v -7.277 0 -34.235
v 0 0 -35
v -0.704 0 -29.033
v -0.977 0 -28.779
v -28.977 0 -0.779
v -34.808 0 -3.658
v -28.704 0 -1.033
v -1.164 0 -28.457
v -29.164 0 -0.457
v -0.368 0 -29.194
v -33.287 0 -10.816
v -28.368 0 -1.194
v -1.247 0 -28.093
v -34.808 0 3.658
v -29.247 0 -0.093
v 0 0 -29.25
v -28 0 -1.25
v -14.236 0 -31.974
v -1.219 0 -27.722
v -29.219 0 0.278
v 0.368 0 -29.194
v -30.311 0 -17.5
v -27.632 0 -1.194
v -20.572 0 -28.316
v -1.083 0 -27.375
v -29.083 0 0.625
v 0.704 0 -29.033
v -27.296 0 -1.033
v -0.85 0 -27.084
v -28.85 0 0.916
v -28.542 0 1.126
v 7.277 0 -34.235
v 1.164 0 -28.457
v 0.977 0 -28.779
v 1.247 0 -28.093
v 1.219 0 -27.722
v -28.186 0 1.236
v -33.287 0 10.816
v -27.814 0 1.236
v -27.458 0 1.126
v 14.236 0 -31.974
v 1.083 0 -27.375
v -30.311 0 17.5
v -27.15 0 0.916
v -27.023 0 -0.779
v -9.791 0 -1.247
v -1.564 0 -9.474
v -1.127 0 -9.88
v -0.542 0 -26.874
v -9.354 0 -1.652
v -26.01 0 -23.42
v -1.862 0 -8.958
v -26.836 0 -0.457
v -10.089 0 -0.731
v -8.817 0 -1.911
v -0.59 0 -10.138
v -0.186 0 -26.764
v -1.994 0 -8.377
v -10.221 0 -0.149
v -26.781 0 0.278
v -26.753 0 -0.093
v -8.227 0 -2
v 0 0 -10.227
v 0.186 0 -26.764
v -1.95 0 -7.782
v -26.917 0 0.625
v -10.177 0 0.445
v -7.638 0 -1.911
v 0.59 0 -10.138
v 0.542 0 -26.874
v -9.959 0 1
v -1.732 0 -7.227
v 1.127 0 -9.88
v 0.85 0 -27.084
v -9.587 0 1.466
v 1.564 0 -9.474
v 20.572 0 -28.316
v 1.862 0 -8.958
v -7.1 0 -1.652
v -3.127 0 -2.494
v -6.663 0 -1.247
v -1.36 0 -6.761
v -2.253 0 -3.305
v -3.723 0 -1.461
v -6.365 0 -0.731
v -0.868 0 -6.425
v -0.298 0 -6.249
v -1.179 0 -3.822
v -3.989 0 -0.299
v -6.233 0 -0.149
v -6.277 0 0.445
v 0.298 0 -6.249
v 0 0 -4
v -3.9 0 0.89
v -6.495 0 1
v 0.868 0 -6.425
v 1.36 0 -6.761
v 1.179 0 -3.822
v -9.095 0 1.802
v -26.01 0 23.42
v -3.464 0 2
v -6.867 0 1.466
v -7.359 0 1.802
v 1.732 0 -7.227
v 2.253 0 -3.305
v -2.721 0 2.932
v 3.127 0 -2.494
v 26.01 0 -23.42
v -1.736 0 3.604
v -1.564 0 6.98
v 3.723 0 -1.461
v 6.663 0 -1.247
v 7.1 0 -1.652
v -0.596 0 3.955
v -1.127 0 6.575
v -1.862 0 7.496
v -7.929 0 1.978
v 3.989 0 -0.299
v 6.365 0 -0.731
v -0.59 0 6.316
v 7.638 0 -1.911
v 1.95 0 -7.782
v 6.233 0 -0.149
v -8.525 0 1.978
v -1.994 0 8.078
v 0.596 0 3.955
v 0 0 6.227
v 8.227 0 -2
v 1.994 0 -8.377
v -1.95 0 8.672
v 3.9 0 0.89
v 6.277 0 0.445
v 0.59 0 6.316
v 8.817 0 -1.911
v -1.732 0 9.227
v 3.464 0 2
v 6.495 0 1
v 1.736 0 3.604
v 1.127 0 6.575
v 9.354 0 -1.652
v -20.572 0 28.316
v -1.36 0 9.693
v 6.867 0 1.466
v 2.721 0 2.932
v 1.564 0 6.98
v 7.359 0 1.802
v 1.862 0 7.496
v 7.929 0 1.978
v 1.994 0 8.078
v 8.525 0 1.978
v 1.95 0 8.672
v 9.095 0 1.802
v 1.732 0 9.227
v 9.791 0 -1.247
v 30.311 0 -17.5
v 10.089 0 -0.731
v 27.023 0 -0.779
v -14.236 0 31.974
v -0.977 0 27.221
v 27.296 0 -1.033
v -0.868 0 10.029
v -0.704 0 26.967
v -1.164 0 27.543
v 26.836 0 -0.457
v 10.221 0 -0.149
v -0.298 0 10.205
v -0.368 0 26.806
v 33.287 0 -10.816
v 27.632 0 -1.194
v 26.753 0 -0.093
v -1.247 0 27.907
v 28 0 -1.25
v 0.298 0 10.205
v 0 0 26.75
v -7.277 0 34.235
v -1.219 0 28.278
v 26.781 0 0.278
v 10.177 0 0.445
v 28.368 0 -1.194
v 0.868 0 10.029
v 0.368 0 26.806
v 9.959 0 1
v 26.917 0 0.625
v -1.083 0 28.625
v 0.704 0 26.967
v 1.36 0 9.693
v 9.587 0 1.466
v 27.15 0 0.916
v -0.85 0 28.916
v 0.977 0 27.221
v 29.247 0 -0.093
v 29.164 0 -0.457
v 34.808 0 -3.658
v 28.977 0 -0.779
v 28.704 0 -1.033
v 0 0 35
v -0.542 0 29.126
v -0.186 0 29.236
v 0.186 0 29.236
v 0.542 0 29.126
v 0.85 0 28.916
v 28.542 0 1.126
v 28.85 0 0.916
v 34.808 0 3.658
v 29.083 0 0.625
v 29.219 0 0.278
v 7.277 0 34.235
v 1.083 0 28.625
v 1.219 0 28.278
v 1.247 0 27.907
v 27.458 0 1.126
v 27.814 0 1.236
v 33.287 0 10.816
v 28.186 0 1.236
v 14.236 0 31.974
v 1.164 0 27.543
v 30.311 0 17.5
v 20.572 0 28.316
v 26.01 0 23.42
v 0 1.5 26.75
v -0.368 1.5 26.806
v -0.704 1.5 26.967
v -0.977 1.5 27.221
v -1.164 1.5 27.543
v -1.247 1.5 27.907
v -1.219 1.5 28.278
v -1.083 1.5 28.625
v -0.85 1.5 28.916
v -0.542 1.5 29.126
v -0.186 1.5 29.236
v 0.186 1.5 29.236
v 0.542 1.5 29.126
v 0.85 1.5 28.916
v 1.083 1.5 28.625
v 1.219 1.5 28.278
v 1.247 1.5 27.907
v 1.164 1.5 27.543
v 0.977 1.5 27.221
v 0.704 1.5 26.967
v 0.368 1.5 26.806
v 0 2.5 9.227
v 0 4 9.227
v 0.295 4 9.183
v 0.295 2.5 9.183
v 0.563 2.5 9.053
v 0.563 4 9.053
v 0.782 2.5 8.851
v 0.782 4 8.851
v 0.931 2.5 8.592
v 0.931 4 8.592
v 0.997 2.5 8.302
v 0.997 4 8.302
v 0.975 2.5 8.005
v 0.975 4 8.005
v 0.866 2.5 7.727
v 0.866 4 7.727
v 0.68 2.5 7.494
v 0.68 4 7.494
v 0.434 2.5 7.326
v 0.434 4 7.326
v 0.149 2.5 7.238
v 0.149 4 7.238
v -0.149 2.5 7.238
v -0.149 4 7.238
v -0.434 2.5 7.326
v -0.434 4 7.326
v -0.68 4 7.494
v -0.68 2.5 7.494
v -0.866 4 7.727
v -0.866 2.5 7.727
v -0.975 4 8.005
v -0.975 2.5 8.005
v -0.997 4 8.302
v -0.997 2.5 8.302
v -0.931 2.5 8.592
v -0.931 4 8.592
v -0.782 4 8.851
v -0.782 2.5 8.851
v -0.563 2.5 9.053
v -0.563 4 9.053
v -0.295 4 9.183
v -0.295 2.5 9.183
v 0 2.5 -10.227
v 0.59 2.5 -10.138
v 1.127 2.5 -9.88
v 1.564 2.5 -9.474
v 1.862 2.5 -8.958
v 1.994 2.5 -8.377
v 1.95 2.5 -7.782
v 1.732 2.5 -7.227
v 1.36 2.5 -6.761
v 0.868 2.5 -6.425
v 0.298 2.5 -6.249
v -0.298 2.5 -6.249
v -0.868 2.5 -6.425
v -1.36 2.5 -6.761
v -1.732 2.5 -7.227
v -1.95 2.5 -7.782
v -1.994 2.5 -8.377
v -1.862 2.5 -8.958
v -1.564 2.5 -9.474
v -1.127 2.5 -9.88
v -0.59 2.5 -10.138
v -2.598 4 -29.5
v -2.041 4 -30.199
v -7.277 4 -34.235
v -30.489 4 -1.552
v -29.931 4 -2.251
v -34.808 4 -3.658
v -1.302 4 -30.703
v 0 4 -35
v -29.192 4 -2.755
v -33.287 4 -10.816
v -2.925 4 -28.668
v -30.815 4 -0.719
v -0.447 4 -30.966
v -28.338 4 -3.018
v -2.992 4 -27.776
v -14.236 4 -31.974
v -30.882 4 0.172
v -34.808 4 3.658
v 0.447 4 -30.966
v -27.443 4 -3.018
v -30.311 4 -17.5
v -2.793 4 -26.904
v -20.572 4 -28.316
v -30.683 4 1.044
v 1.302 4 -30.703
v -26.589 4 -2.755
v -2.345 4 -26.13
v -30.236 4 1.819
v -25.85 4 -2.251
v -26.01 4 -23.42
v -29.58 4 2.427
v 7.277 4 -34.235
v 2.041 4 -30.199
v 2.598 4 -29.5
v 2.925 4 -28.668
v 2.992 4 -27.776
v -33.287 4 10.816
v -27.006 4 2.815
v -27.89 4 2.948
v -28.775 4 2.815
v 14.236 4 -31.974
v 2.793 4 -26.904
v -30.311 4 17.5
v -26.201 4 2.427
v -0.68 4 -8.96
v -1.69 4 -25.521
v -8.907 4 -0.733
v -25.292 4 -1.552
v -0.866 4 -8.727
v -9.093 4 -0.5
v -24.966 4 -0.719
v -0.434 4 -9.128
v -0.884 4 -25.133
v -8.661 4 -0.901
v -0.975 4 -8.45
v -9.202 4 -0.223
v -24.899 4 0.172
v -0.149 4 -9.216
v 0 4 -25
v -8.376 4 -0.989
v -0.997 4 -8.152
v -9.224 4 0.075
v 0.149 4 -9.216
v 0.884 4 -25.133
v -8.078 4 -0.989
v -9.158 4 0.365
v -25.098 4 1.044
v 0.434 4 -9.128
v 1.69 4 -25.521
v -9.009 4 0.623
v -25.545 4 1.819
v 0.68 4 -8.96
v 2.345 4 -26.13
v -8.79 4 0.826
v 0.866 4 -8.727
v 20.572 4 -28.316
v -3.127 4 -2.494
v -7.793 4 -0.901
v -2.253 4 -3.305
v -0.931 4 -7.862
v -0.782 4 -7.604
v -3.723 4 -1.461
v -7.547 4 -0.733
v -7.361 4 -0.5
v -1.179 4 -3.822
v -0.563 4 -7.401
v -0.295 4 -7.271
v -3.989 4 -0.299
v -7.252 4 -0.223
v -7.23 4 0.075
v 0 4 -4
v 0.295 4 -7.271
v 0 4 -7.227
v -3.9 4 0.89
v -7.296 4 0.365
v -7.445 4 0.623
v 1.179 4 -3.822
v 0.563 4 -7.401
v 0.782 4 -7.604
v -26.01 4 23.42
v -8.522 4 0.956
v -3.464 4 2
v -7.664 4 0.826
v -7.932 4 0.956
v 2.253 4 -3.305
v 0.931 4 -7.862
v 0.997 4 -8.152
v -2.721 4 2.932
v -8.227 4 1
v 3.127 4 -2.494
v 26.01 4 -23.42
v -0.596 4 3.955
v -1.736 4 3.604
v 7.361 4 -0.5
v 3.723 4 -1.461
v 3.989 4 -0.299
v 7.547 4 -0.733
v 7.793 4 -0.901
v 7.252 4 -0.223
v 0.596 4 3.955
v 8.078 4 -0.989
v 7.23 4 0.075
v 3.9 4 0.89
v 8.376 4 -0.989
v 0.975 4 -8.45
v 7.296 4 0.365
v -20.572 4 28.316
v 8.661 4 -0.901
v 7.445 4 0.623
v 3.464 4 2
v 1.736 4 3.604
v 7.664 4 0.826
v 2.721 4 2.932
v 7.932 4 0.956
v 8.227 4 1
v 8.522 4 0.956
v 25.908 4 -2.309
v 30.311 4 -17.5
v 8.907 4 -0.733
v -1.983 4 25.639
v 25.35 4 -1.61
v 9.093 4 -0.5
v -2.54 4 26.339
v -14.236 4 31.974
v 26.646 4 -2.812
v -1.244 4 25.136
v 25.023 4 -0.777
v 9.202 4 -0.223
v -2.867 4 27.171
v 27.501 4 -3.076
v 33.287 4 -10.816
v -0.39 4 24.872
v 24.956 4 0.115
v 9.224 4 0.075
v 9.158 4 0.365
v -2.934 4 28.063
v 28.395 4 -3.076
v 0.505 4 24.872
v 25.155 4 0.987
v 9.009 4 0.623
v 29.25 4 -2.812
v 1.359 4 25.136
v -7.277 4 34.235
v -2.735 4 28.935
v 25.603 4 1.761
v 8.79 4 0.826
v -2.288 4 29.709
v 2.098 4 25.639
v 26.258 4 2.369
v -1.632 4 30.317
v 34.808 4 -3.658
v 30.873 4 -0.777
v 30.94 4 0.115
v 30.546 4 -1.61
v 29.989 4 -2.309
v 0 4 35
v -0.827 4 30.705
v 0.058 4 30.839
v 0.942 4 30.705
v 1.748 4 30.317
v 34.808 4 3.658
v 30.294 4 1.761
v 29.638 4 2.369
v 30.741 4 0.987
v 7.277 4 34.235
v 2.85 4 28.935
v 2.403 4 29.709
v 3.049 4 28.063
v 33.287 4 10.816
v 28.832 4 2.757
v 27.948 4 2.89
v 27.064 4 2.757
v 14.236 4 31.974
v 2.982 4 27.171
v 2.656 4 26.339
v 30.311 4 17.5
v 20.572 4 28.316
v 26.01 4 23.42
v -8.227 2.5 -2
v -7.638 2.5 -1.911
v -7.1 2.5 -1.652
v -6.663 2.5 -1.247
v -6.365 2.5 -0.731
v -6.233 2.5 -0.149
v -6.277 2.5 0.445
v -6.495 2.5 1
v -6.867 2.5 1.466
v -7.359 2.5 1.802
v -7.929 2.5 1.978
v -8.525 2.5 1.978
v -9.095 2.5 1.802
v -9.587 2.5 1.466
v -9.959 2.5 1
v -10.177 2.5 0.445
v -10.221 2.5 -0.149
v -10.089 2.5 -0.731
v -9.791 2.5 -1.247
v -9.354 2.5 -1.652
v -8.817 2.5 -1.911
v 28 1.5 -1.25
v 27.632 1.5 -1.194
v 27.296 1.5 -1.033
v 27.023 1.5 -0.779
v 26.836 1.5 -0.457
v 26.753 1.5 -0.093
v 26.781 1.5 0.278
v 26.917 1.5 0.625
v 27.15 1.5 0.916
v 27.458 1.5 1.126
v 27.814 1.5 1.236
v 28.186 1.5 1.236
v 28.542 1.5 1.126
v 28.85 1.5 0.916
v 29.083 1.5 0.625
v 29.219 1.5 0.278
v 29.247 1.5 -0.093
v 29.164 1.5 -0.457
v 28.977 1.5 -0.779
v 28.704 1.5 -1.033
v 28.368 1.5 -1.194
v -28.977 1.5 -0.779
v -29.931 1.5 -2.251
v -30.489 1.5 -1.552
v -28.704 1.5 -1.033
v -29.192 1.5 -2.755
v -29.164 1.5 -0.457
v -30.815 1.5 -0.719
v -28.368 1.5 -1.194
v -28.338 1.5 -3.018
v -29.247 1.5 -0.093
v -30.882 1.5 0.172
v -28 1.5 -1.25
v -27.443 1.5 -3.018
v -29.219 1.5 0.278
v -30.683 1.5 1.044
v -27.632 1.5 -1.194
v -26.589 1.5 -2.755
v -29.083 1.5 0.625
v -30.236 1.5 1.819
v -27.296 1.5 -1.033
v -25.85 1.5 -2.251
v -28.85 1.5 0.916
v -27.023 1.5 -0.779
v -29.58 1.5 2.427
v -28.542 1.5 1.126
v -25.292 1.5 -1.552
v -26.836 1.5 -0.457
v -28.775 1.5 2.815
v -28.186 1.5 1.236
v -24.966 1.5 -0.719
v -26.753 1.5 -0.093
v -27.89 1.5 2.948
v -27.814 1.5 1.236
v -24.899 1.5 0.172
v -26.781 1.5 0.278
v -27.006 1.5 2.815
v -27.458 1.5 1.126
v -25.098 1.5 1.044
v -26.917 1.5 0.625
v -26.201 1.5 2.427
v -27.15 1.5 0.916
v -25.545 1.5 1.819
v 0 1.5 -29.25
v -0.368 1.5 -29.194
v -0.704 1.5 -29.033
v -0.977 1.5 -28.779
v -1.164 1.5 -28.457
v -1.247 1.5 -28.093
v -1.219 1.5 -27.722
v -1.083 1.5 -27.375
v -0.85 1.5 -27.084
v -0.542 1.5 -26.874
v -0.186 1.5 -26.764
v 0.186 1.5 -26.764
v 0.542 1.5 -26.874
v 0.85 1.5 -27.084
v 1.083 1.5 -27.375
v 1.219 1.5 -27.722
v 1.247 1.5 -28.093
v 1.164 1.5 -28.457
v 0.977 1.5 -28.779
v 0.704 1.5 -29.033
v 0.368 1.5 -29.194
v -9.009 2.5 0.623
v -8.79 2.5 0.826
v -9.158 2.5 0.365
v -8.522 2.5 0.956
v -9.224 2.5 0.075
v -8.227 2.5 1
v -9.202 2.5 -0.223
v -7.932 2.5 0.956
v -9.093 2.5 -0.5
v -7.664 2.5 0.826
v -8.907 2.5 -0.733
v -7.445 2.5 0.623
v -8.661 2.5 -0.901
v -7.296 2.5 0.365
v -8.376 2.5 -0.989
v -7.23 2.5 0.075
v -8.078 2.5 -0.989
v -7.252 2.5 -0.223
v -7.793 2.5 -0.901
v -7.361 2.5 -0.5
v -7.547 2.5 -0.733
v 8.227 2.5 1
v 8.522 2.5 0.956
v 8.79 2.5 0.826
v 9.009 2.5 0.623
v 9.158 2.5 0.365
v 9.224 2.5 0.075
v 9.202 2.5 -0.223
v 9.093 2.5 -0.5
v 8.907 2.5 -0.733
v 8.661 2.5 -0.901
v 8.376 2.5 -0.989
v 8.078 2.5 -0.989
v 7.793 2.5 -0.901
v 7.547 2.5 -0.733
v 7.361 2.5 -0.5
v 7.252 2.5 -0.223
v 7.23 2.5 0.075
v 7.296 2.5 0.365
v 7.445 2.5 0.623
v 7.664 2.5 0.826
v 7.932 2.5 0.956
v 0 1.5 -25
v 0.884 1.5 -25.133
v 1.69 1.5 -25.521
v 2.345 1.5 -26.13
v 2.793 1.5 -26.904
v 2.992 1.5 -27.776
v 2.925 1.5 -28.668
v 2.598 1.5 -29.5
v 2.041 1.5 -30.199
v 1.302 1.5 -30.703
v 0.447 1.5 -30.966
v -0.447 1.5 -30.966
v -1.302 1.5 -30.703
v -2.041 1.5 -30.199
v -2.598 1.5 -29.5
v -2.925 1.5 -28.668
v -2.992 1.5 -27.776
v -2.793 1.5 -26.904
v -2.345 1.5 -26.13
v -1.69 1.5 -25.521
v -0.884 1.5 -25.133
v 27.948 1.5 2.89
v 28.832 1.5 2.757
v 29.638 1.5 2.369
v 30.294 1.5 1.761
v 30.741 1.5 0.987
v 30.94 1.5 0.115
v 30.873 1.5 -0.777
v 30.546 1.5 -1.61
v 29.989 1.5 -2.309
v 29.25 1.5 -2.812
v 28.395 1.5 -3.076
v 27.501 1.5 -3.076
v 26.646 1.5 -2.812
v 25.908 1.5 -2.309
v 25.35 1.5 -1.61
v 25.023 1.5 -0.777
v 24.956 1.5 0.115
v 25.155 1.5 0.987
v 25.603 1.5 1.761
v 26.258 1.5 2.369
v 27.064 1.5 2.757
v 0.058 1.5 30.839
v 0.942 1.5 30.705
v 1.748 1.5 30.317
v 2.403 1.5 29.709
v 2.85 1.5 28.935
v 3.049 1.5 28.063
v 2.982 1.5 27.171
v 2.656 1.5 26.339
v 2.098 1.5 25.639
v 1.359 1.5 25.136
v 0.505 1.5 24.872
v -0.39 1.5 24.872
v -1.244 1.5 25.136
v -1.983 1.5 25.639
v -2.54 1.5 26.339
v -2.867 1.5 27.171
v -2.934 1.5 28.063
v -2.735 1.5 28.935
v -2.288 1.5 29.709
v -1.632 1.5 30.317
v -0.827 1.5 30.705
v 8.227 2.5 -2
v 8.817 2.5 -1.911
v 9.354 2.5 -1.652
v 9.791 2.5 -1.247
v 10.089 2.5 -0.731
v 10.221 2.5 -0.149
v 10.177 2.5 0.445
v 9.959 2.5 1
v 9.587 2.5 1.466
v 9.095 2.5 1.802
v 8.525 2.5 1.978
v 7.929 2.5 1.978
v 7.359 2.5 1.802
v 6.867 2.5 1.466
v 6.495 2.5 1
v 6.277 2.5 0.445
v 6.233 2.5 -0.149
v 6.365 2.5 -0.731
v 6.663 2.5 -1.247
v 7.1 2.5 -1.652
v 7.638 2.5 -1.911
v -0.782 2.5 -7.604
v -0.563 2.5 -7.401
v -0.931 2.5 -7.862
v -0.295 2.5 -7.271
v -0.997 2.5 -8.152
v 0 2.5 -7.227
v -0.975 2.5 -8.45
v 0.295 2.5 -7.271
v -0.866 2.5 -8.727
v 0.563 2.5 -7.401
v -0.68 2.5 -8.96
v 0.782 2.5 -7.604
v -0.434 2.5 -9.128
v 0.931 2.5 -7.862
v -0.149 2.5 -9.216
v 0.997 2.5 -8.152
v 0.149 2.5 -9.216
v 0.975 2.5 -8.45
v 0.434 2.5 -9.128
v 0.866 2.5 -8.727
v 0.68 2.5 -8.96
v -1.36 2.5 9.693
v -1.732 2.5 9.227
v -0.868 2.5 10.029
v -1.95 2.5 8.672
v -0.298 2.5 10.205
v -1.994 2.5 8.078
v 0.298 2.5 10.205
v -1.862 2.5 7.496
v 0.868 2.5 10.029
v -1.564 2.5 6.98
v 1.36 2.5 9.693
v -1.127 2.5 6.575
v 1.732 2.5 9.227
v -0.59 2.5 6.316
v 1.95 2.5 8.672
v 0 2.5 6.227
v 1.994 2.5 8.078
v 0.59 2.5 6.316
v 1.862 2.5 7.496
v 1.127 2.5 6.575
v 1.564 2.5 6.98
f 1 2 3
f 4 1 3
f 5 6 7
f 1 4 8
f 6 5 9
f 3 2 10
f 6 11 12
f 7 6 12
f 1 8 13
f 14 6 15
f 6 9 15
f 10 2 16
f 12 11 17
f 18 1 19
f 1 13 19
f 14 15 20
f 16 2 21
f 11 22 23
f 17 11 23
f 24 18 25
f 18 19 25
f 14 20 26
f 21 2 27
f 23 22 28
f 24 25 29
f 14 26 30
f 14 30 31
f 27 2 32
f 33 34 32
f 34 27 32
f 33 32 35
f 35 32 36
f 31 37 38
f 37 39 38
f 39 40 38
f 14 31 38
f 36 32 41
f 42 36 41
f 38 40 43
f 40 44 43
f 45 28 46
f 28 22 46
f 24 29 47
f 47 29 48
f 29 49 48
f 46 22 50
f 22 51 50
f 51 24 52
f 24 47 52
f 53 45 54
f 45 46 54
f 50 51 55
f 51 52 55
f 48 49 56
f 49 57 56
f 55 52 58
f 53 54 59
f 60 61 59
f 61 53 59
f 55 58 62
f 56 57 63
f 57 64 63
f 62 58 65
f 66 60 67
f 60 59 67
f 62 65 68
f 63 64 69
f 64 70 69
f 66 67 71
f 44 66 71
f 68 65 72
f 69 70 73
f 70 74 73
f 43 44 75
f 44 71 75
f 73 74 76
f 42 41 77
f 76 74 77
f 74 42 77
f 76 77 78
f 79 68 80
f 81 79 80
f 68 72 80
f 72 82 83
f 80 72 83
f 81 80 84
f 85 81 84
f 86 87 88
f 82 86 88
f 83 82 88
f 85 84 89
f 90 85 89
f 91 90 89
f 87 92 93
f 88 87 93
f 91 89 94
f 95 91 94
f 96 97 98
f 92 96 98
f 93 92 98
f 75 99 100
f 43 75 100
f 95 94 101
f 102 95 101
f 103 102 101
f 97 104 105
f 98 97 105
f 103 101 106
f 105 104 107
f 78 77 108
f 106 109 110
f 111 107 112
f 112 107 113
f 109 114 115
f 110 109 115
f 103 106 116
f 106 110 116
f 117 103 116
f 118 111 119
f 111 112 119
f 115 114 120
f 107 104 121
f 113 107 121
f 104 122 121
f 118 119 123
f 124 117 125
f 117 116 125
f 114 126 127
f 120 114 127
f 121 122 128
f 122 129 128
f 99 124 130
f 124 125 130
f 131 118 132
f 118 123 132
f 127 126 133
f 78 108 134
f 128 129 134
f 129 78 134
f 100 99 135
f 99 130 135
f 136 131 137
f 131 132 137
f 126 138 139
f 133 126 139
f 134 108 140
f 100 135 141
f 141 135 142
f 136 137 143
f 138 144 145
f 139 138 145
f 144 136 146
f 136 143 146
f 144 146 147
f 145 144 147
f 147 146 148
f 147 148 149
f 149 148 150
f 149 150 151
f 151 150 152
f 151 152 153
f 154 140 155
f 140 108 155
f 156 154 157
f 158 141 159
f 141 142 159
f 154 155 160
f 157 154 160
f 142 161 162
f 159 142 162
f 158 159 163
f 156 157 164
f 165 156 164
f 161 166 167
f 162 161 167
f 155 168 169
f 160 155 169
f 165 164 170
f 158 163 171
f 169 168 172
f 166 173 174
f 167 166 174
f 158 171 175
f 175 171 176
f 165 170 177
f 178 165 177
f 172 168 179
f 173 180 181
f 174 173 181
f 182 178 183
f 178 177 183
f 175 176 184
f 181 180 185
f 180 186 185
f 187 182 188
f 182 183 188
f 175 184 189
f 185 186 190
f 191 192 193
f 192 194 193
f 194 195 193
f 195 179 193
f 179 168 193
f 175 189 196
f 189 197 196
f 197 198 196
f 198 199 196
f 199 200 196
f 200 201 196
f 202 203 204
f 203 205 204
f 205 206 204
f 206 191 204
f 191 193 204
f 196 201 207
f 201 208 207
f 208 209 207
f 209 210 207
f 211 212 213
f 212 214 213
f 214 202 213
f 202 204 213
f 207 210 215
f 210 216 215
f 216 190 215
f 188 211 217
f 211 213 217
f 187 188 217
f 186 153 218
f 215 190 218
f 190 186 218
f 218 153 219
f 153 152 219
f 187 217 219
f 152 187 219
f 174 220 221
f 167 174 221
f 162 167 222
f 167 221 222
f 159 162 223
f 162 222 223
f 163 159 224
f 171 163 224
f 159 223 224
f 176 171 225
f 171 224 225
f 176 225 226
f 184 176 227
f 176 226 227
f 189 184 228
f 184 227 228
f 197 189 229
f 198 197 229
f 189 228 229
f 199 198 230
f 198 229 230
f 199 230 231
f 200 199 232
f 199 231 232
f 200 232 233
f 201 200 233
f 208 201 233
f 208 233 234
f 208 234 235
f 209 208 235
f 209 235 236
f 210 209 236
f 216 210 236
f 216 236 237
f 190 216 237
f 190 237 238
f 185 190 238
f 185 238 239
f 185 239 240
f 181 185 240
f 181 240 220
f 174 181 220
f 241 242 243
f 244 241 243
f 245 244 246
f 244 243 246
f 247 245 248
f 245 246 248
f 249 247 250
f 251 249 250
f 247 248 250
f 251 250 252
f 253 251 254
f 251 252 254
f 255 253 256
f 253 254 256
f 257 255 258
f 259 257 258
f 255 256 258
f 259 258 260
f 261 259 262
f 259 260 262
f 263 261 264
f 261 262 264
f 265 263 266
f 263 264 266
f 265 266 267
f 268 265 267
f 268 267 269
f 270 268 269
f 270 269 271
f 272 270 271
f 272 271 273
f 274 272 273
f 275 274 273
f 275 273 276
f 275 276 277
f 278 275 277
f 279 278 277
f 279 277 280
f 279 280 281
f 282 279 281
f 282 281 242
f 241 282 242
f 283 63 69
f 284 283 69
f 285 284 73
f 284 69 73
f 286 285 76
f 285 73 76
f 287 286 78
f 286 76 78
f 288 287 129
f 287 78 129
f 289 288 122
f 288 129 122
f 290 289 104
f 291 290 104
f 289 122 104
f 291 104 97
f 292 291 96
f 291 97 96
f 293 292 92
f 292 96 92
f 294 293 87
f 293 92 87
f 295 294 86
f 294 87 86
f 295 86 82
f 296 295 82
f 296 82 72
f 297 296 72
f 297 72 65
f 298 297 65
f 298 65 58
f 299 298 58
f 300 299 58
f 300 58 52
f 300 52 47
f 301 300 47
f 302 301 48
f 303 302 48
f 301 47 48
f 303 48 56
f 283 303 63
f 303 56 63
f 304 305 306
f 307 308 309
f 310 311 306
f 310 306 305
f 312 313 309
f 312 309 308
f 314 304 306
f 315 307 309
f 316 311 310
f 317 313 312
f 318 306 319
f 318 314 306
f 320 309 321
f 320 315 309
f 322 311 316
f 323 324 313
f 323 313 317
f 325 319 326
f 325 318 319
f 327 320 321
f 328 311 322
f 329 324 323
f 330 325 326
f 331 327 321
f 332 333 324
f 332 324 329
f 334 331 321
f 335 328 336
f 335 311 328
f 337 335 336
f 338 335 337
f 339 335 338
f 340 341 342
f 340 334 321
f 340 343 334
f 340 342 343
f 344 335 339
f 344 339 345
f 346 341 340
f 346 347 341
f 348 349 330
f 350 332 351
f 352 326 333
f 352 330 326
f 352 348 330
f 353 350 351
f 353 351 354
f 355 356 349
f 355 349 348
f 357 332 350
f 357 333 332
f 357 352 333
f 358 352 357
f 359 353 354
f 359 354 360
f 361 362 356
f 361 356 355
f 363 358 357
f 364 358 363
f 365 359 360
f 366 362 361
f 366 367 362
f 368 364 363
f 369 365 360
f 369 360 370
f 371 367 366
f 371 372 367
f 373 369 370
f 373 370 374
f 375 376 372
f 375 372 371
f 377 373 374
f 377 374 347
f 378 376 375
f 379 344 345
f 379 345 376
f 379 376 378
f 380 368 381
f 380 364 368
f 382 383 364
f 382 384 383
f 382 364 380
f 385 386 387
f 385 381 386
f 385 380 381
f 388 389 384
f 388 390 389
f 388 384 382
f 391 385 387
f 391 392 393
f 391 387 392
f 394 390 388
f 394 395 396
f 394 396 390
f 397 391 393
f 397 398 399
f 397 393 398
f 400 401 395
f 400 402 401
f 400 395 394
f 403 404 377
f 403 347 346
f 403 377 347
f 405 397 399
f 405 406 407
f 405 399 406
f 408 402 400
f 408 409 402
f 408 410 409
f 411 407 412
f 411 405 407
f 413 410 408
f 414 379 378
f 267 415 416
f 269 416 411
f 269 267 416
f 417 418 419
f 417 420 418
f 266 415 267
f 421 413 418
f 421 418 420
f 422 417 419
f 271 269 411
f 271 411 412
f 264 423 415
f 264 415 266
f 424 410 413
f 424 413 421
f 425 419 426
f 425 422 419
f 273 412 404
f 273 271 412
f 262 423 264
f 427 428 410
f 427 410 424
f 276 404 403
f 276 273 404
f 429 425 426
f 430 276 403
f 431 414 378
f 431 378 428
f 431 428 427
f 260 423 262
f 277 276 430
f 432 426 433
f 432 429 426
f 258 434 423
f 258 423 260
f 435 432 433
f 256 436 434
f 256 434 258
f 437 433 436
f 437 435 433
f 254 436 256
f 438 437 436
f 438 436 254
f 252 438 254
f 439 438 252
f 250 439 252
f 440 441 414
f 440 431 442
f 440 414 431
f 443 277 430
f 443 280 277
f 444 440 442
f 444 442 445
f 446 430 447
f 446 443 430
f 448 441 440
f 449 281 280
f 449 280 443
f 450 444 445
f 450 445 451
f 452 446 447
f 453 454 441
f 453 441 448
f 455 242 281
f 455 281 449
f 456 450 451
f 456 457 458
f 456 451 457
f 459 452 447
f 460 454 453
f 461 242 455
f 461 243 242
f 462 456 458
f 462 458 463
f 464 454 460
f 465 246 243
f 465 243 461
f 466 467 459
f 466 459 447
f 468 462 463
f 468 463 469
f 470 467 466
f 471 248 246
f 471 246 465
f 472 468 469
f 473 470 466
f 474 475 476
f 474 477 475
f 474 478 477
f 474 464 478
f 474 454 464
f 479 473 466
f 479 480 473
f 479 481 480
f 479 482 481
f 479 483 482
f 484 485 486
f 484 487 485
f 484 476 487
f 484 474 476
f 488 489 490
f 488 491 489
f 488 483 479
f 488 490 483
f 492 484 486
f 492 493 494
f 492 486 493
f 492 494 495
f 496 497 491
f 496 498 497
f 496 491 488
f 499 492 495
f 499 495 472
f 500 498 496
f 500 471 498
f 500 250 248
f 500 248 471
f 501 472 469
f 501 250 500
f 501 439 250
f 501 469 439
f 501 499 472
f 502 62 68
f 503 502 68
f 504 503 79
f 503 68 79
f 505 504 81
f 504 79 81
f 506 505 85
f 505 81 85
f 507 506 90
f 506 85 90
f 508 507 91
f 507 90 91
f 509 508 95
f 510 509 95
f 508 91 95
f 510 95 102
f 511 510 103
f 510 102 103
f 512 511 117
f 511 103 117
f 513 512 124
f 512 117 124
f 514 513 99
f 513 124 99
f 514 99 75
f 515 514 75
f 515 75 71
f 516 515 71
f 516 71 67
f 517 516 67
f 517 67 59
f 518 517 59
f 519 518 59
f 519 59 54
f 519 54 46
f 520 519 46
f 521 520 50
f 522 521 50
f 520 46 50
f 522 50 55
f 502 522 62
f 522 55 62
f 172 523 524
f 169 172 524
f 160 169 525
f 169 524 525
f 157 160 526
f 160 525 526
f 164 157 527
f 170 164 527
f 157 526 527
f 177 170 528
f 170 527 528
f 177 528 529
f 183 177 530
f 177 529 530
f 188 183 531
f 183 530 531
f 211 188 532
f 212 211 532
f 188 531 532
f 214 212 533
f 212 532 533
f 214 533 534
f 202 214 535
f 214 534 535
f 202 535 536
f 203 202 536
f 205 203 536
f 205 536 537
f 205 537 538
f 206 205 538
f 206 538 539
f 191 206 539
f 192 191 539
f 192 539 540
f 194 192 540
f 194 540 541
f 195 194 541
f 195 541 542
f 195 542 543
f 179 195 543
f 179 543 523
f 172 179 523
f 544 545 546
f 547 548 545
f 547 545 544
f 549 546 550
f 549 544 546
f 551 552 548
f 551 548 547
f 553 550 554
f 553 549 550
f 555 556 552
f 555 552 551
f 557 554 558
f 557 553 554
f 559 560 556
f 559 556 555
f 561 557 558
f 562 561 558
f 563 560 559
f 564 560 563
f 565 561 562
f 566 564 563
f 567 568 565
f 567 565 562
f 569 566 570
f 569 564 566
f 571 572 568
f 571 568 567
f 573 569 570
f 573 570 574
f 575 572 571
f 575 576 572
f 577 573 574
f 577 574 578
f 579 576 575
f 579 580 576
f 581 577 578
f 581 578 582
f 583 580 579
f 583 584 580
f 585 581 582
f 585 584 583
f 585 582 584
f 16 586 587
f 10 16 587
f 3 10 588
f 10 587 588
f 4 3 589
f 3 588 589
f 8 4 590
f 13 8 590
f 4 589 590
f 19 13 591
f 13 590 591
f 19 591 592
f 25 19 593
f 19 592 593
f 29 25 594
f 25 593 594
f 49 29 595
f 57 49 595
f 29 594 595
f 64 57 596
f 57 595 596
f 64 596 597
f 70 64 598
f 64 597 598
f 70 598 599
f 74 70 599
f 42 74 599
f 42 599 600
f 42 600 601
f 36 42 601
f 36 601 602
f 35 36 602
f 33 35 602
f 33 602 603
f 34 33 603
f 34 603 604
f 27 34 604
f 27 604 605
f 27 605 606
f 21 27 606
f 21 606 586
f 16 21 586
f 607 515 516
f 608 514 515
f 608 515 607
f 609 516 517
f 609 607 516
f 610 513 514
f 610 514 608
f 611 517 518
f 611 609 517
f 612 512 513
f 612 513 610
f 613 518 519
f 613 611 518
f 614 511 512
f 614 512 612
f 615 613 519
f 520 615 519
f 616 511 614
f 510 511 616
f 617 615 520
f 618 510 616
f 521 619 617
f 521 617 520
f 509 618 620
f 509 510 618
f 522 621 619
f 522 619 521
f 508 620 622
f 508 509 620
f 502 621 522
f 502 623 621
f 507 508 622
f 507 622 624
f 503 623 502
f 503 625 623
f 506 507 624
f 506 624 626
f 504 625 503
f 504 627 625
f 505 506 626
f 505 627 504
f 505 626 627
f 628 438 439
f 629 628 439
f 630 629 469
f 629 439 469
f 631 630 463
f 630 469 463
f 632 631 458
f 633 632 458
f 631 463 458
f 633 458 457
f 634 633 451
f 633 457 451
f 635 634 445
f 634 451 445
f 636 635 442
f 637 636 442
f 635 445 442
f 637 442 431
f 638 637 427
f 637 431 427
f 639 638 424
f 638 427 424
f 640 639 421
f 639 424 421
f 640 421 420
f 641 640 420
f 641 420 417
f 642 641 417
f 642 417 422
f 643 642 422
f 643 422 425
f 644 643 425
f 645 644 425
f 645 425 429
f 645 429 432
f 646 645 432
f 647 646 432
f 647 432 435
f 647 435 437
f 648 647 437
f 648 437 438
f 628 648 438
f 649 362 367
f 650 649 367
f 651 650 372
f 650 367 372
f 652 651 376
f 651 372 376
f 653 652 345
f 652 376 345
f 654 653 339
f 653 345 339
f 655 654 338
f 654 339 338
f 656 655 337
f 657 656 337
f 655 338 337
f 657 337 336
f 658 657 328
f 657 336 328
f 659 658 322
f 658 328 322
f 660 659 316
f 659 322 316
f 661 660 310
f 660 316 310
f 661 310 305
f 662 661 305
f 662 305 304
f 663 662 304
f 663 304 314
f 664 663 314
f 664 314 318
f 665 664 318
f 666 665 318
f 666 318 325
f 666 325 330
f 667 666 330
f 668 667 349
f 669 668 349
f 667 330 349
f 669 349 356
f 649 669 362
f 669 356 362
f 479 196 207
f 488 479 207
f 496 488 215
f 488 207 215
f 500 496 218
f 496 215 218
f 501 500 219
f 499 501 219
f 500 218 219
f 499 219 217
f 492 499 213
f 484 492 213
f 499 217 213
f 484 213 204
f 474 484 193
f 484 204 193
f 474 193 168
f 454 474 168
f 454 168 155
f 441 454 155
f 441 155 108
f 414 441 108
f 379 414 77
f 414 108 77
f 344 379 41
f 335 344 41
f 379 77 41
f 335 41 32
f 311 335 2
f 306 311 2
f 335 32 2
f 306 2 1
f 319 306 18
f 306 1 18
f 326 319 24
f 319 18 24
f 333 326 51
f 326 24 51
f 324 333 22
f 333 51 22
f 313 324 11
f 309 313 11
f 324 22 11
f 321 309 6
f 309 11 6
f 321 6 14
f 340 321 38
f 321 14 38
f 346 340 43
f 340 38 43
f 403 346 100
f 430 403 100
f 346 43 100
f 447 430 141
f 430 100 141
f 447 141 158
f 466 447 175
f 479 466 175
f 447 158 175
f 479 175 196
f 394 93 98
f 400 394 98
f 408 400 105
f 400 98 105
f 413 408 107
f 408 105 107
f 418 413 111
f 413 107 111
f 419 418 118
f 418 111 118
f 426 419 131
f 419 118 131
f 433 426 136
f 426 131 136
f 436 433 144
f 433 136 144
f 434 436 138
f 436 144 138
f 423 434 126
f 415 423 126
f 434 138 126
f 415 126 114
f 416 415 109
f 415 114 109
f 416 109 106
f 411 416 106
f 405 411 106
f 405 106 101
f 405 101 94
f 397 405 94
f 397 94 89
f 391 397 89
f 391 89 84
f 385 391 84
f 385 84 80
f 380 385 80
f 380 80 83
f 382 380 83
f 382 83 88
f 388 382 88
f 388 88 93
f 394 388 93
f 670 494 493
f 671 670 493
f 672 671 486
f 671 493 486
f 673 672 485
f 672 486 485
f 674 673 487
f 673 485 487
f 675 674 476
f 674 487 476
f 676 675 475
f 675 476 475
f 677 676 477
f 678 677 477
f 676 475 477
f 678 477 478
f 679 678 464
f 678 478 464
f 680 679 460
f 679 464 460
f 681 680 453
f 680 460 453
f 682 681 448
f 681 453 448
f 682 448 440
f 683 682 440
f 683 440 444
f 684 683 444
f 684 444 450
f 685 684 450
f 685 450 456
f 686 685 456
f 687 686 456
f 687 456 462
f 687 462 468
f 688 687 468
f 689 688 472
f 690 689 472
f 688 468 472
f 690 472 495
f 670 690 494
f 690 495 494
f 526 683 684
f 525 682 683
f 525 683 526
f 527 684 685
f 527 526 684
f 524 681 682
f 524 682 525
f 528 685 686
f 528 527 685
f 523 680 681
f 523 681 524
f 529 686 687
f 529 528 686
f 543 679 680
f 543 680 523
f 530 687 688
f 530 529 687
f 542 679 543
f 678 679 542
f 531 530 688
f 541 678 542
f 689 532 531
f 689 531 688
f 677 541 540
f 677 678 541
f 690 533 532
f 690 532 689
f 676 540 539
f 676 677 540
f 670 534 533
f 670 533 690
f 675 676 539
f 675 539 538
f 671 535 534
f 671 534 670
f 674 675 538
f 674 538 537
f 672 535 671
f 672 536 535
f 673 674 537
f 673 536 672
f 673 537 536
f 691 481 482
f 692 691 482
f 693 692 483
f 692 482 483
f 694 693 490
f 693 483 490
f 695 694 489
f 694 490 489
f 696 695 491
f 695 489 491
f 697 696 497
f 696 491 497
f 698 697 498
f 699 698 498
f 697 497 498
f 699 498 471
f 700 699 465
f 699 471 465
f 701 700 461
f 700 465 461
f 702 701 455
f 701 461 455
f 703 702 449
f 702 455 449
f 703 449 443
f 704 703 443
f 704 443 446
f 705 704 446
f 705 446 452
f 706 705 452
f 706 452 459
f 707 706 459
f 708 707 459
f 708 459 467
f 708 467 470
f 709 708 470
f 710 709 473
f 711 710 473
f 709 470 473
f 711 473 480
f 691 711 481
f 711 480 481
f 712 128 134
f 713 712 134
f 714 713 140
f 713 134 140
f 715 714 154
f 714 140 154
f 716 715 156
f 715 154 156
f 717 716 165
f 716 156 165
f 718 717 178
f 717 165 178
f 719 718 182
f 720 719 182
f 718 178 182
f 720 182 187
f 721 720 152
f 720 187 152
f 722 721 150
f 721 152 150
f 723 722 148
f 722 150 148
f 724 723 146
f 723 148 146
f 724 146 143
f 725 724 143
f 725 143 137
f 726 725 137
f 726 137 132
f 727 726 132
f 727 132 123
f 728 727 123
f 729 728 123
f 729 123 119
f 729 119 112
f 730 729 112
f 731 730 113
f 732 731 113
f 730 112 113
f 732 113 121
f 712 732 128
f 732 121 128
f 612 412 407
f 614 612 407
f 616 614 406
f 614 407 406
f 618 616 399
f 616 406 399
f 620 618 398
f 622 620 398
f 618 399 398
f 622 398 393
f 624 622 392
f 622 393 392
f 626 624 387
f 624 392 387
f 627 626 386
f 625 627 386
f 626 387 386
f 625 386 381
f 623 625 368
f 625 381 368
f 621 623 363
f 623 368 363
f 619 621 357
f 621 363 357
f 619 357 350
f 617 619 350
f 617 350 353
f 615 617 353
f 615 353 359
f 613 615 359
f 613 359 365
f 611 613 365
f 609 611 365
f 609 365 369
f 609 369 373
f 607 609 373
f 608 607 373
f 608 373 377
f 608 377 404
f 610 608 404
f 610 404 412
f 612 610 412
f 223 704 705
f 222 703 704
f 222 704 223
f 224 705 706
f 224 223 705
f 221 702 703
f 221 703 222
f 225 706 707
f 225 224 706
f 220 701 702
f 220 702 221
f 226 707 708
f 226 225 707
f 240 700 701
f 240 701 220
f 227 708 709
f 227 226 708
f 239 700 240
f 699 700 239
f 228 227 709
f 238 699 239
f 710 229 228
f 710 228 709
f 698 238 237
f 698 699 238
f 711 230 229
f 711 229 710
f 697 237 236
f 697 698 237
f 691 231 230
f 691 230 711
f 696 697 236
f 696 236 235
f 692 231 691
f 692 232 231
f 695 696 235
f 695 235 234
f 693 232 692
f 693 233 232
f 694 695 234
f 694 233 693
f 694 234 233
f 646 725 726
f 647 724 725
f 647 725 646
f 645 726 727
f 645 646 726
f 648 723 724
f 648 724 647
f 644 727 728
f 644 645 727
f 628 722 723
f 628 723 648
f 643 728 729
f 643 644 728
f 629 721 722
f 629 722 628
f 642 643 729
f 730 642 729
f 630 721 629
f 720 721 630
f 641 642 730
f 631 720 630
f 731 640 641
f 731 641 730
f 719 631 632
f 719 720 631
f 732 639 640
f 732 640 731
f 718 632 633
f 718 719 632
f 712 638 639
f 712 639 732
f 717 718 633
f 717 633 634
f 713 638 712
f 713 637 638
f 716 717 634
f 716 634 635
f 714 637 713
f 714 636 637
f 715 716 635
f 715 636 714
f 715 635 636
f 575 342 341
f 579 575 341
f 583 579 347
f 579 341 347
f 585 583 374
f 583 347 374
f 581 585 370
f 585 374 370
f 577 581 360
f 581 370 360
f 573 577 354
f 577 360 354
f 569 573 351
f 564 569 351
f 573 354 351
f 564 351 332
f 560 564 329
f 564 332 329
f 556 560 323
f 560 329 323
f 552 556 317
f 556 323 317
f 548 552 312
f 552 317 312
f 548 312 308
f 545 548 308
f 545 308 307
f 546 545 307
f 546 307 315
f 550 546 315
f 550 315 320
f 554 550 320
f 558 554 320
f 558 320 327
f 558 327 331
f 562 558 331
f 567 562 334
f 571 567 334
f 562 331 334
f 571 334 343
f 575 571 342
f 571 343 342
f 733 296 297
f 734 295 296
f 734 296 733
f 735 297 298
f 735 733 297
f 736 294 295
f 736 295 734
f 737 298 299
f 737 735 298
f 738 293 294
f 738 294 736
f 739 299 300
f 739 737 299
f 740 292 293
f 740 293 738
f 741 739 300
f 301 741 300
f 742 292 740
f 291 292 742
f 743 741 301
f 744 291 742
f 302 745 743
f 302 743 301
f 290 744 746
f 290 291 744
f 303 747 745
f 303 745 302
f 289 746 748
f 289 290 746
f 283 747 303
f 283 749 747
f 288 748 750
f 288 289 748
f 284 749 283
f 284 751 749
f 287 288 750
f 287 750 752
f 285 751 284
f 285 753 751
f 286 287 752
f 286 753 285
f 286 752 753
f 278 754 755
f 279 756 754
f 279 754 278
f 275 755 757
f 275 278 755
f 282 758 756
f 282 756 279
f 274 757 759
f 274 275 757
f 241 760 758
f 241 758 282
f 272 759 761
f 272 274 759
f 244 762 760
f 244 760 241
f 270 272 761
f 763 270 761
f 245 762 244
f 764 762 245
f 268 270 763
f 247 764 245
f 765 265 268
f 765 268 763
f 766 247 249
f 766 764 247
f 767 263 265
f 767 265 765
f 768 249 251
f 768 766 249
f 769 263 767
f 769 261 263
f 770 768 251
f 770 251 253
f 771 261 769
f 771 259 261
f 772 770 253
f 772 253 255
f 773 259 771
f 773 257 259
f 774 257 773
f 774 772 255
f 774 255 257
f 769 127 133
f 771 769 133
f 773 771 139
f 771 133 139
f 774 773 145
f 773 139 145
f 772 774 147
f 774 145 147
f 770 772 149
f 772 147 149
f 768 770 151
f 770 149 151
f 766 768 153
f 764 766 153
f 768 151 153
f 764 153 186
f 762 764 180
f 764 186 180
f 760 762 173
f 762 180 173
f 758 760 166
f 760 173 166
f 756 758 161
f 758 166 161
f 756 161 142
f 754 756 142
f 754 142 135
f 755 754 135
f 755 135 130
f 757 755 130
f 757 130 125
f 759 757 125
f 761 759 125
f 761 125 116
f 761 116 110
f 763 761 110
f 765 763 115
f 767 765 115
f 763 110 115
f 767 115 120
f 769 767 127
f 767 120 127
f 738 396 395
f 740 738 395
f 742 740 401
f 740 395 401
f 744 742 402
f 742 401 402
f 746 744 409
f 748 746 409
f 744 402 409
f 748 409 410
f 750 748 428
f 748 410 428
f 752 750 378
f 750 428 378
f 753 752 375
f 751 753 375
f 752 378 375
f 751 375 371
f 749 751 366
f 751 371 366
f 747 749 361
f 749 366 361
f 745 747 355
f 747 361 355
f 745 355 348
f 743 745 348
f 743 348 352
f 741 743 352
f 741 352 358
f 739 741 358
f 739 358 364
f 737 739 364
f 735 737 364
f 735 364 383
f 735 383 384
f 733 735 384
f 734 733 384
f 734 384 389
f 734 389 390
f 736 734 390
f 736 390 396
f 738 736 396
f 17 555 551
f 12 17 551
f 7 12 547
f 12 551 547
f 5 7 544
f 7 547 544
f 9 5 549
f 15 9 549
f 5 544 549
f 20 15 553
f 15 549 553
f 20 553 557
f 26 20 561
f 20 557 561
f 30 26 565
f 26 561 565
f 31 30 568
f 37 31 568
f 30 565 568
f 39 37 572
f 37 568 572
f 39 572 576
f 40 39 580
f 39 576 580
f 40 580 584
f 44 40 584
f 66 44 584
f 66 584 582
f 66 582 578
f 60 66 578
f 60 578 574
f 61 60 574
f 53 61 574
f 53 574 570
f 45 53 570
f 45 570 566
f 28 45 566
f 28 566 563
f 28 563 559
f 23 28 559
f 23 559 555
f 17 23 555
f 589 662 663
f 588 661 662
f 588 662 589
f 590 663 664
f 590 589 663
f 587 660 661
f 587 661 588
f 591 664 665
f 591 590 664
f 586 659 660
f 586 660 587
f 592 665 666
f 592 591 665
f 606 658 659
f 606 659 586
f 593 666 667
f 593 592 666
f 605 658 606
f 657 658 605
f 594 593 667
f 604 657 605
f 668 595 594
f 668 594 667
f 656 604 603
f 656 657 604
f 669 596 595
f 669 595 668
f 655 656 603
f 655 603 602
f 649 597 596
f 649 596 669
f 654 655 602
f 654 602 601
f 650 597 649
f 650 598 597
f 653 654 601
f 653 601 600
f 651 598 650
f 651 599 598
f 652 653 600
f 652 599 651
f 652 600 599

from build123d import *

# Parameters (mm, degrees)
SKETCH1_R           = 35
BOSS_EXTRUDE1_DEPTH = 4
SKETCH2_R           = 1
SKETCH2_R_2         = 1.25
CUT_EXTRUDE1_DEPTH  = 50.658836072
CUT_EXTRUDE2_REACH  = 51.659
SKETCH3_R           = 4
SKETCH4_R           = 3
CUT_EXTRUDE3_DEPTH  = 2.5
SKETCH5_R           = 2
CUT_EXTRUDE4_DEPTH  = 2.5


with BuildPart() as part:
    # Sketch1 → Boss-Extrude1 (new body)
    with BuildSketch(Plane(origin=(0, 0, 0), x_dir=(1, 0, 0), z_dir=(0, 1, 0))):
        with Locations(Location((0, 0, 0), (0, 0, 270))):
            Circle(SKETCH1_R)
    extrude(amount=BOSS_EXTRUDE1_DEPTH)

    # Sketch2 → Cut-Extrude1 (cut, through all)
    with BuildSketch(Plane(origin=(0, 4, 0), x_dir=(1, 0, 0), z_dir=(0, 1, 0))):
        with Locations(Location((0, 8.227062517, 0), (0, 0, 270))):
            Circle(SKETCH2_R)
        with Locations(Location((8.227062517, 0, 0), (0, 0, 270))):
            Circle(SKETCH2_R)
        with Locations(Location((0, -8.227062517, 0), (0, 0, 270))):
            Circle(SKETCH2_R)
        with Locations(Location((-8.227062517, 0, 0), (0, 0, 270))):
            Circle(SKETCH2_R)
        with Locations(Location((0, -28, 0), (0, 0, 90))):
            Circle(SKETCH2_R_2)
        with Locations(Location((-28, 0, 0), (0, 0, 90))):
            Circle(SKETCH2_R_2)
        with Locations(Location((0, 28, 0), (0, 0, 90))):
            Circle(SKETCH2_R_2)
        with Locations(Location((28, 0, 0), (0, 0, 90))):
            Circle(SKETCH2_R_2)
    extrude(amount=-CUT_EXTRUDE1_DEPTH, mode=Mode.SUBTRACT)

    # Sketch3 → Cut-Extrude2 (cut, up to next)
    with BuildSketch(Plane.XZ, mode=Mode.PRIVATE) as cut_extrude2_sk1:
        with Locations(Location((0, 0, 0), (0, 0, 270))):
            Circle(SKETCH3_R)
    cut_extrude2_tool1 = extrude(cut_extrude2_sk1.sketch, amount=-CUT_EXTRUDE2_REACH, mode=Mode.PRIVATE) & part.part
    add(cut_extrude2_tool1.solids().sort_by_distance((0, 0, 0))[0], mode=Mode.SUBTRACT)

    # Sketch4 → Cut-Extrude3 (cut)
    with BuildSketch(Plane(origin=(0, 4, 0), x_dir=(1, 0, 0), z_dir=(0, 1, 0))):
        with Locations(Location((0, 28, 0), (0, 0, 270))):
            Circle(SKETCH4_R)
        with Locations(Location((27.948073418, 0.109503391, 0), (0, 0, 270))):
            Circle(SKETCH4_R)
        with Locations(Location((0.057576809, -27.838570027, 0), (0, 0, 270))):
            Circle(SKETCH4_R)
        with Locations(Location((-27.890496609, 0.051926582, 0), (0, 0, 270))):
            Circle(SKETCH4_R)
    extrude(amount=-CUT_EXTRUDE3_DEPTH, mode=Mode.SUBTRACT)

    # Sketch5 → Cut-Extrude4 (cut)
    with BuildSketch(Plane.XZ):
        with Locations(Location((0, 8.227062517, 0), (0, 0, 270))):
            Circle(SKETCH5_R)
        with Locations(Location((8.227062517, 0, 0), (0, 0, 270))):
            Circle(SKETCH5_R)
        with Locations(Location((0, -8.227062517, 0), (0, 0, 270))):
            Circle(SKETCH5_R)
        with Locations(Location((-8.227062517, 0, 0), (0, 0, 270))):
            Circle(SKETCH5_R)
    extrude(amount=-CUT_EXTRUDE4_DEPTH, mode=Mode.SUBTRACT)


solid = part.part
